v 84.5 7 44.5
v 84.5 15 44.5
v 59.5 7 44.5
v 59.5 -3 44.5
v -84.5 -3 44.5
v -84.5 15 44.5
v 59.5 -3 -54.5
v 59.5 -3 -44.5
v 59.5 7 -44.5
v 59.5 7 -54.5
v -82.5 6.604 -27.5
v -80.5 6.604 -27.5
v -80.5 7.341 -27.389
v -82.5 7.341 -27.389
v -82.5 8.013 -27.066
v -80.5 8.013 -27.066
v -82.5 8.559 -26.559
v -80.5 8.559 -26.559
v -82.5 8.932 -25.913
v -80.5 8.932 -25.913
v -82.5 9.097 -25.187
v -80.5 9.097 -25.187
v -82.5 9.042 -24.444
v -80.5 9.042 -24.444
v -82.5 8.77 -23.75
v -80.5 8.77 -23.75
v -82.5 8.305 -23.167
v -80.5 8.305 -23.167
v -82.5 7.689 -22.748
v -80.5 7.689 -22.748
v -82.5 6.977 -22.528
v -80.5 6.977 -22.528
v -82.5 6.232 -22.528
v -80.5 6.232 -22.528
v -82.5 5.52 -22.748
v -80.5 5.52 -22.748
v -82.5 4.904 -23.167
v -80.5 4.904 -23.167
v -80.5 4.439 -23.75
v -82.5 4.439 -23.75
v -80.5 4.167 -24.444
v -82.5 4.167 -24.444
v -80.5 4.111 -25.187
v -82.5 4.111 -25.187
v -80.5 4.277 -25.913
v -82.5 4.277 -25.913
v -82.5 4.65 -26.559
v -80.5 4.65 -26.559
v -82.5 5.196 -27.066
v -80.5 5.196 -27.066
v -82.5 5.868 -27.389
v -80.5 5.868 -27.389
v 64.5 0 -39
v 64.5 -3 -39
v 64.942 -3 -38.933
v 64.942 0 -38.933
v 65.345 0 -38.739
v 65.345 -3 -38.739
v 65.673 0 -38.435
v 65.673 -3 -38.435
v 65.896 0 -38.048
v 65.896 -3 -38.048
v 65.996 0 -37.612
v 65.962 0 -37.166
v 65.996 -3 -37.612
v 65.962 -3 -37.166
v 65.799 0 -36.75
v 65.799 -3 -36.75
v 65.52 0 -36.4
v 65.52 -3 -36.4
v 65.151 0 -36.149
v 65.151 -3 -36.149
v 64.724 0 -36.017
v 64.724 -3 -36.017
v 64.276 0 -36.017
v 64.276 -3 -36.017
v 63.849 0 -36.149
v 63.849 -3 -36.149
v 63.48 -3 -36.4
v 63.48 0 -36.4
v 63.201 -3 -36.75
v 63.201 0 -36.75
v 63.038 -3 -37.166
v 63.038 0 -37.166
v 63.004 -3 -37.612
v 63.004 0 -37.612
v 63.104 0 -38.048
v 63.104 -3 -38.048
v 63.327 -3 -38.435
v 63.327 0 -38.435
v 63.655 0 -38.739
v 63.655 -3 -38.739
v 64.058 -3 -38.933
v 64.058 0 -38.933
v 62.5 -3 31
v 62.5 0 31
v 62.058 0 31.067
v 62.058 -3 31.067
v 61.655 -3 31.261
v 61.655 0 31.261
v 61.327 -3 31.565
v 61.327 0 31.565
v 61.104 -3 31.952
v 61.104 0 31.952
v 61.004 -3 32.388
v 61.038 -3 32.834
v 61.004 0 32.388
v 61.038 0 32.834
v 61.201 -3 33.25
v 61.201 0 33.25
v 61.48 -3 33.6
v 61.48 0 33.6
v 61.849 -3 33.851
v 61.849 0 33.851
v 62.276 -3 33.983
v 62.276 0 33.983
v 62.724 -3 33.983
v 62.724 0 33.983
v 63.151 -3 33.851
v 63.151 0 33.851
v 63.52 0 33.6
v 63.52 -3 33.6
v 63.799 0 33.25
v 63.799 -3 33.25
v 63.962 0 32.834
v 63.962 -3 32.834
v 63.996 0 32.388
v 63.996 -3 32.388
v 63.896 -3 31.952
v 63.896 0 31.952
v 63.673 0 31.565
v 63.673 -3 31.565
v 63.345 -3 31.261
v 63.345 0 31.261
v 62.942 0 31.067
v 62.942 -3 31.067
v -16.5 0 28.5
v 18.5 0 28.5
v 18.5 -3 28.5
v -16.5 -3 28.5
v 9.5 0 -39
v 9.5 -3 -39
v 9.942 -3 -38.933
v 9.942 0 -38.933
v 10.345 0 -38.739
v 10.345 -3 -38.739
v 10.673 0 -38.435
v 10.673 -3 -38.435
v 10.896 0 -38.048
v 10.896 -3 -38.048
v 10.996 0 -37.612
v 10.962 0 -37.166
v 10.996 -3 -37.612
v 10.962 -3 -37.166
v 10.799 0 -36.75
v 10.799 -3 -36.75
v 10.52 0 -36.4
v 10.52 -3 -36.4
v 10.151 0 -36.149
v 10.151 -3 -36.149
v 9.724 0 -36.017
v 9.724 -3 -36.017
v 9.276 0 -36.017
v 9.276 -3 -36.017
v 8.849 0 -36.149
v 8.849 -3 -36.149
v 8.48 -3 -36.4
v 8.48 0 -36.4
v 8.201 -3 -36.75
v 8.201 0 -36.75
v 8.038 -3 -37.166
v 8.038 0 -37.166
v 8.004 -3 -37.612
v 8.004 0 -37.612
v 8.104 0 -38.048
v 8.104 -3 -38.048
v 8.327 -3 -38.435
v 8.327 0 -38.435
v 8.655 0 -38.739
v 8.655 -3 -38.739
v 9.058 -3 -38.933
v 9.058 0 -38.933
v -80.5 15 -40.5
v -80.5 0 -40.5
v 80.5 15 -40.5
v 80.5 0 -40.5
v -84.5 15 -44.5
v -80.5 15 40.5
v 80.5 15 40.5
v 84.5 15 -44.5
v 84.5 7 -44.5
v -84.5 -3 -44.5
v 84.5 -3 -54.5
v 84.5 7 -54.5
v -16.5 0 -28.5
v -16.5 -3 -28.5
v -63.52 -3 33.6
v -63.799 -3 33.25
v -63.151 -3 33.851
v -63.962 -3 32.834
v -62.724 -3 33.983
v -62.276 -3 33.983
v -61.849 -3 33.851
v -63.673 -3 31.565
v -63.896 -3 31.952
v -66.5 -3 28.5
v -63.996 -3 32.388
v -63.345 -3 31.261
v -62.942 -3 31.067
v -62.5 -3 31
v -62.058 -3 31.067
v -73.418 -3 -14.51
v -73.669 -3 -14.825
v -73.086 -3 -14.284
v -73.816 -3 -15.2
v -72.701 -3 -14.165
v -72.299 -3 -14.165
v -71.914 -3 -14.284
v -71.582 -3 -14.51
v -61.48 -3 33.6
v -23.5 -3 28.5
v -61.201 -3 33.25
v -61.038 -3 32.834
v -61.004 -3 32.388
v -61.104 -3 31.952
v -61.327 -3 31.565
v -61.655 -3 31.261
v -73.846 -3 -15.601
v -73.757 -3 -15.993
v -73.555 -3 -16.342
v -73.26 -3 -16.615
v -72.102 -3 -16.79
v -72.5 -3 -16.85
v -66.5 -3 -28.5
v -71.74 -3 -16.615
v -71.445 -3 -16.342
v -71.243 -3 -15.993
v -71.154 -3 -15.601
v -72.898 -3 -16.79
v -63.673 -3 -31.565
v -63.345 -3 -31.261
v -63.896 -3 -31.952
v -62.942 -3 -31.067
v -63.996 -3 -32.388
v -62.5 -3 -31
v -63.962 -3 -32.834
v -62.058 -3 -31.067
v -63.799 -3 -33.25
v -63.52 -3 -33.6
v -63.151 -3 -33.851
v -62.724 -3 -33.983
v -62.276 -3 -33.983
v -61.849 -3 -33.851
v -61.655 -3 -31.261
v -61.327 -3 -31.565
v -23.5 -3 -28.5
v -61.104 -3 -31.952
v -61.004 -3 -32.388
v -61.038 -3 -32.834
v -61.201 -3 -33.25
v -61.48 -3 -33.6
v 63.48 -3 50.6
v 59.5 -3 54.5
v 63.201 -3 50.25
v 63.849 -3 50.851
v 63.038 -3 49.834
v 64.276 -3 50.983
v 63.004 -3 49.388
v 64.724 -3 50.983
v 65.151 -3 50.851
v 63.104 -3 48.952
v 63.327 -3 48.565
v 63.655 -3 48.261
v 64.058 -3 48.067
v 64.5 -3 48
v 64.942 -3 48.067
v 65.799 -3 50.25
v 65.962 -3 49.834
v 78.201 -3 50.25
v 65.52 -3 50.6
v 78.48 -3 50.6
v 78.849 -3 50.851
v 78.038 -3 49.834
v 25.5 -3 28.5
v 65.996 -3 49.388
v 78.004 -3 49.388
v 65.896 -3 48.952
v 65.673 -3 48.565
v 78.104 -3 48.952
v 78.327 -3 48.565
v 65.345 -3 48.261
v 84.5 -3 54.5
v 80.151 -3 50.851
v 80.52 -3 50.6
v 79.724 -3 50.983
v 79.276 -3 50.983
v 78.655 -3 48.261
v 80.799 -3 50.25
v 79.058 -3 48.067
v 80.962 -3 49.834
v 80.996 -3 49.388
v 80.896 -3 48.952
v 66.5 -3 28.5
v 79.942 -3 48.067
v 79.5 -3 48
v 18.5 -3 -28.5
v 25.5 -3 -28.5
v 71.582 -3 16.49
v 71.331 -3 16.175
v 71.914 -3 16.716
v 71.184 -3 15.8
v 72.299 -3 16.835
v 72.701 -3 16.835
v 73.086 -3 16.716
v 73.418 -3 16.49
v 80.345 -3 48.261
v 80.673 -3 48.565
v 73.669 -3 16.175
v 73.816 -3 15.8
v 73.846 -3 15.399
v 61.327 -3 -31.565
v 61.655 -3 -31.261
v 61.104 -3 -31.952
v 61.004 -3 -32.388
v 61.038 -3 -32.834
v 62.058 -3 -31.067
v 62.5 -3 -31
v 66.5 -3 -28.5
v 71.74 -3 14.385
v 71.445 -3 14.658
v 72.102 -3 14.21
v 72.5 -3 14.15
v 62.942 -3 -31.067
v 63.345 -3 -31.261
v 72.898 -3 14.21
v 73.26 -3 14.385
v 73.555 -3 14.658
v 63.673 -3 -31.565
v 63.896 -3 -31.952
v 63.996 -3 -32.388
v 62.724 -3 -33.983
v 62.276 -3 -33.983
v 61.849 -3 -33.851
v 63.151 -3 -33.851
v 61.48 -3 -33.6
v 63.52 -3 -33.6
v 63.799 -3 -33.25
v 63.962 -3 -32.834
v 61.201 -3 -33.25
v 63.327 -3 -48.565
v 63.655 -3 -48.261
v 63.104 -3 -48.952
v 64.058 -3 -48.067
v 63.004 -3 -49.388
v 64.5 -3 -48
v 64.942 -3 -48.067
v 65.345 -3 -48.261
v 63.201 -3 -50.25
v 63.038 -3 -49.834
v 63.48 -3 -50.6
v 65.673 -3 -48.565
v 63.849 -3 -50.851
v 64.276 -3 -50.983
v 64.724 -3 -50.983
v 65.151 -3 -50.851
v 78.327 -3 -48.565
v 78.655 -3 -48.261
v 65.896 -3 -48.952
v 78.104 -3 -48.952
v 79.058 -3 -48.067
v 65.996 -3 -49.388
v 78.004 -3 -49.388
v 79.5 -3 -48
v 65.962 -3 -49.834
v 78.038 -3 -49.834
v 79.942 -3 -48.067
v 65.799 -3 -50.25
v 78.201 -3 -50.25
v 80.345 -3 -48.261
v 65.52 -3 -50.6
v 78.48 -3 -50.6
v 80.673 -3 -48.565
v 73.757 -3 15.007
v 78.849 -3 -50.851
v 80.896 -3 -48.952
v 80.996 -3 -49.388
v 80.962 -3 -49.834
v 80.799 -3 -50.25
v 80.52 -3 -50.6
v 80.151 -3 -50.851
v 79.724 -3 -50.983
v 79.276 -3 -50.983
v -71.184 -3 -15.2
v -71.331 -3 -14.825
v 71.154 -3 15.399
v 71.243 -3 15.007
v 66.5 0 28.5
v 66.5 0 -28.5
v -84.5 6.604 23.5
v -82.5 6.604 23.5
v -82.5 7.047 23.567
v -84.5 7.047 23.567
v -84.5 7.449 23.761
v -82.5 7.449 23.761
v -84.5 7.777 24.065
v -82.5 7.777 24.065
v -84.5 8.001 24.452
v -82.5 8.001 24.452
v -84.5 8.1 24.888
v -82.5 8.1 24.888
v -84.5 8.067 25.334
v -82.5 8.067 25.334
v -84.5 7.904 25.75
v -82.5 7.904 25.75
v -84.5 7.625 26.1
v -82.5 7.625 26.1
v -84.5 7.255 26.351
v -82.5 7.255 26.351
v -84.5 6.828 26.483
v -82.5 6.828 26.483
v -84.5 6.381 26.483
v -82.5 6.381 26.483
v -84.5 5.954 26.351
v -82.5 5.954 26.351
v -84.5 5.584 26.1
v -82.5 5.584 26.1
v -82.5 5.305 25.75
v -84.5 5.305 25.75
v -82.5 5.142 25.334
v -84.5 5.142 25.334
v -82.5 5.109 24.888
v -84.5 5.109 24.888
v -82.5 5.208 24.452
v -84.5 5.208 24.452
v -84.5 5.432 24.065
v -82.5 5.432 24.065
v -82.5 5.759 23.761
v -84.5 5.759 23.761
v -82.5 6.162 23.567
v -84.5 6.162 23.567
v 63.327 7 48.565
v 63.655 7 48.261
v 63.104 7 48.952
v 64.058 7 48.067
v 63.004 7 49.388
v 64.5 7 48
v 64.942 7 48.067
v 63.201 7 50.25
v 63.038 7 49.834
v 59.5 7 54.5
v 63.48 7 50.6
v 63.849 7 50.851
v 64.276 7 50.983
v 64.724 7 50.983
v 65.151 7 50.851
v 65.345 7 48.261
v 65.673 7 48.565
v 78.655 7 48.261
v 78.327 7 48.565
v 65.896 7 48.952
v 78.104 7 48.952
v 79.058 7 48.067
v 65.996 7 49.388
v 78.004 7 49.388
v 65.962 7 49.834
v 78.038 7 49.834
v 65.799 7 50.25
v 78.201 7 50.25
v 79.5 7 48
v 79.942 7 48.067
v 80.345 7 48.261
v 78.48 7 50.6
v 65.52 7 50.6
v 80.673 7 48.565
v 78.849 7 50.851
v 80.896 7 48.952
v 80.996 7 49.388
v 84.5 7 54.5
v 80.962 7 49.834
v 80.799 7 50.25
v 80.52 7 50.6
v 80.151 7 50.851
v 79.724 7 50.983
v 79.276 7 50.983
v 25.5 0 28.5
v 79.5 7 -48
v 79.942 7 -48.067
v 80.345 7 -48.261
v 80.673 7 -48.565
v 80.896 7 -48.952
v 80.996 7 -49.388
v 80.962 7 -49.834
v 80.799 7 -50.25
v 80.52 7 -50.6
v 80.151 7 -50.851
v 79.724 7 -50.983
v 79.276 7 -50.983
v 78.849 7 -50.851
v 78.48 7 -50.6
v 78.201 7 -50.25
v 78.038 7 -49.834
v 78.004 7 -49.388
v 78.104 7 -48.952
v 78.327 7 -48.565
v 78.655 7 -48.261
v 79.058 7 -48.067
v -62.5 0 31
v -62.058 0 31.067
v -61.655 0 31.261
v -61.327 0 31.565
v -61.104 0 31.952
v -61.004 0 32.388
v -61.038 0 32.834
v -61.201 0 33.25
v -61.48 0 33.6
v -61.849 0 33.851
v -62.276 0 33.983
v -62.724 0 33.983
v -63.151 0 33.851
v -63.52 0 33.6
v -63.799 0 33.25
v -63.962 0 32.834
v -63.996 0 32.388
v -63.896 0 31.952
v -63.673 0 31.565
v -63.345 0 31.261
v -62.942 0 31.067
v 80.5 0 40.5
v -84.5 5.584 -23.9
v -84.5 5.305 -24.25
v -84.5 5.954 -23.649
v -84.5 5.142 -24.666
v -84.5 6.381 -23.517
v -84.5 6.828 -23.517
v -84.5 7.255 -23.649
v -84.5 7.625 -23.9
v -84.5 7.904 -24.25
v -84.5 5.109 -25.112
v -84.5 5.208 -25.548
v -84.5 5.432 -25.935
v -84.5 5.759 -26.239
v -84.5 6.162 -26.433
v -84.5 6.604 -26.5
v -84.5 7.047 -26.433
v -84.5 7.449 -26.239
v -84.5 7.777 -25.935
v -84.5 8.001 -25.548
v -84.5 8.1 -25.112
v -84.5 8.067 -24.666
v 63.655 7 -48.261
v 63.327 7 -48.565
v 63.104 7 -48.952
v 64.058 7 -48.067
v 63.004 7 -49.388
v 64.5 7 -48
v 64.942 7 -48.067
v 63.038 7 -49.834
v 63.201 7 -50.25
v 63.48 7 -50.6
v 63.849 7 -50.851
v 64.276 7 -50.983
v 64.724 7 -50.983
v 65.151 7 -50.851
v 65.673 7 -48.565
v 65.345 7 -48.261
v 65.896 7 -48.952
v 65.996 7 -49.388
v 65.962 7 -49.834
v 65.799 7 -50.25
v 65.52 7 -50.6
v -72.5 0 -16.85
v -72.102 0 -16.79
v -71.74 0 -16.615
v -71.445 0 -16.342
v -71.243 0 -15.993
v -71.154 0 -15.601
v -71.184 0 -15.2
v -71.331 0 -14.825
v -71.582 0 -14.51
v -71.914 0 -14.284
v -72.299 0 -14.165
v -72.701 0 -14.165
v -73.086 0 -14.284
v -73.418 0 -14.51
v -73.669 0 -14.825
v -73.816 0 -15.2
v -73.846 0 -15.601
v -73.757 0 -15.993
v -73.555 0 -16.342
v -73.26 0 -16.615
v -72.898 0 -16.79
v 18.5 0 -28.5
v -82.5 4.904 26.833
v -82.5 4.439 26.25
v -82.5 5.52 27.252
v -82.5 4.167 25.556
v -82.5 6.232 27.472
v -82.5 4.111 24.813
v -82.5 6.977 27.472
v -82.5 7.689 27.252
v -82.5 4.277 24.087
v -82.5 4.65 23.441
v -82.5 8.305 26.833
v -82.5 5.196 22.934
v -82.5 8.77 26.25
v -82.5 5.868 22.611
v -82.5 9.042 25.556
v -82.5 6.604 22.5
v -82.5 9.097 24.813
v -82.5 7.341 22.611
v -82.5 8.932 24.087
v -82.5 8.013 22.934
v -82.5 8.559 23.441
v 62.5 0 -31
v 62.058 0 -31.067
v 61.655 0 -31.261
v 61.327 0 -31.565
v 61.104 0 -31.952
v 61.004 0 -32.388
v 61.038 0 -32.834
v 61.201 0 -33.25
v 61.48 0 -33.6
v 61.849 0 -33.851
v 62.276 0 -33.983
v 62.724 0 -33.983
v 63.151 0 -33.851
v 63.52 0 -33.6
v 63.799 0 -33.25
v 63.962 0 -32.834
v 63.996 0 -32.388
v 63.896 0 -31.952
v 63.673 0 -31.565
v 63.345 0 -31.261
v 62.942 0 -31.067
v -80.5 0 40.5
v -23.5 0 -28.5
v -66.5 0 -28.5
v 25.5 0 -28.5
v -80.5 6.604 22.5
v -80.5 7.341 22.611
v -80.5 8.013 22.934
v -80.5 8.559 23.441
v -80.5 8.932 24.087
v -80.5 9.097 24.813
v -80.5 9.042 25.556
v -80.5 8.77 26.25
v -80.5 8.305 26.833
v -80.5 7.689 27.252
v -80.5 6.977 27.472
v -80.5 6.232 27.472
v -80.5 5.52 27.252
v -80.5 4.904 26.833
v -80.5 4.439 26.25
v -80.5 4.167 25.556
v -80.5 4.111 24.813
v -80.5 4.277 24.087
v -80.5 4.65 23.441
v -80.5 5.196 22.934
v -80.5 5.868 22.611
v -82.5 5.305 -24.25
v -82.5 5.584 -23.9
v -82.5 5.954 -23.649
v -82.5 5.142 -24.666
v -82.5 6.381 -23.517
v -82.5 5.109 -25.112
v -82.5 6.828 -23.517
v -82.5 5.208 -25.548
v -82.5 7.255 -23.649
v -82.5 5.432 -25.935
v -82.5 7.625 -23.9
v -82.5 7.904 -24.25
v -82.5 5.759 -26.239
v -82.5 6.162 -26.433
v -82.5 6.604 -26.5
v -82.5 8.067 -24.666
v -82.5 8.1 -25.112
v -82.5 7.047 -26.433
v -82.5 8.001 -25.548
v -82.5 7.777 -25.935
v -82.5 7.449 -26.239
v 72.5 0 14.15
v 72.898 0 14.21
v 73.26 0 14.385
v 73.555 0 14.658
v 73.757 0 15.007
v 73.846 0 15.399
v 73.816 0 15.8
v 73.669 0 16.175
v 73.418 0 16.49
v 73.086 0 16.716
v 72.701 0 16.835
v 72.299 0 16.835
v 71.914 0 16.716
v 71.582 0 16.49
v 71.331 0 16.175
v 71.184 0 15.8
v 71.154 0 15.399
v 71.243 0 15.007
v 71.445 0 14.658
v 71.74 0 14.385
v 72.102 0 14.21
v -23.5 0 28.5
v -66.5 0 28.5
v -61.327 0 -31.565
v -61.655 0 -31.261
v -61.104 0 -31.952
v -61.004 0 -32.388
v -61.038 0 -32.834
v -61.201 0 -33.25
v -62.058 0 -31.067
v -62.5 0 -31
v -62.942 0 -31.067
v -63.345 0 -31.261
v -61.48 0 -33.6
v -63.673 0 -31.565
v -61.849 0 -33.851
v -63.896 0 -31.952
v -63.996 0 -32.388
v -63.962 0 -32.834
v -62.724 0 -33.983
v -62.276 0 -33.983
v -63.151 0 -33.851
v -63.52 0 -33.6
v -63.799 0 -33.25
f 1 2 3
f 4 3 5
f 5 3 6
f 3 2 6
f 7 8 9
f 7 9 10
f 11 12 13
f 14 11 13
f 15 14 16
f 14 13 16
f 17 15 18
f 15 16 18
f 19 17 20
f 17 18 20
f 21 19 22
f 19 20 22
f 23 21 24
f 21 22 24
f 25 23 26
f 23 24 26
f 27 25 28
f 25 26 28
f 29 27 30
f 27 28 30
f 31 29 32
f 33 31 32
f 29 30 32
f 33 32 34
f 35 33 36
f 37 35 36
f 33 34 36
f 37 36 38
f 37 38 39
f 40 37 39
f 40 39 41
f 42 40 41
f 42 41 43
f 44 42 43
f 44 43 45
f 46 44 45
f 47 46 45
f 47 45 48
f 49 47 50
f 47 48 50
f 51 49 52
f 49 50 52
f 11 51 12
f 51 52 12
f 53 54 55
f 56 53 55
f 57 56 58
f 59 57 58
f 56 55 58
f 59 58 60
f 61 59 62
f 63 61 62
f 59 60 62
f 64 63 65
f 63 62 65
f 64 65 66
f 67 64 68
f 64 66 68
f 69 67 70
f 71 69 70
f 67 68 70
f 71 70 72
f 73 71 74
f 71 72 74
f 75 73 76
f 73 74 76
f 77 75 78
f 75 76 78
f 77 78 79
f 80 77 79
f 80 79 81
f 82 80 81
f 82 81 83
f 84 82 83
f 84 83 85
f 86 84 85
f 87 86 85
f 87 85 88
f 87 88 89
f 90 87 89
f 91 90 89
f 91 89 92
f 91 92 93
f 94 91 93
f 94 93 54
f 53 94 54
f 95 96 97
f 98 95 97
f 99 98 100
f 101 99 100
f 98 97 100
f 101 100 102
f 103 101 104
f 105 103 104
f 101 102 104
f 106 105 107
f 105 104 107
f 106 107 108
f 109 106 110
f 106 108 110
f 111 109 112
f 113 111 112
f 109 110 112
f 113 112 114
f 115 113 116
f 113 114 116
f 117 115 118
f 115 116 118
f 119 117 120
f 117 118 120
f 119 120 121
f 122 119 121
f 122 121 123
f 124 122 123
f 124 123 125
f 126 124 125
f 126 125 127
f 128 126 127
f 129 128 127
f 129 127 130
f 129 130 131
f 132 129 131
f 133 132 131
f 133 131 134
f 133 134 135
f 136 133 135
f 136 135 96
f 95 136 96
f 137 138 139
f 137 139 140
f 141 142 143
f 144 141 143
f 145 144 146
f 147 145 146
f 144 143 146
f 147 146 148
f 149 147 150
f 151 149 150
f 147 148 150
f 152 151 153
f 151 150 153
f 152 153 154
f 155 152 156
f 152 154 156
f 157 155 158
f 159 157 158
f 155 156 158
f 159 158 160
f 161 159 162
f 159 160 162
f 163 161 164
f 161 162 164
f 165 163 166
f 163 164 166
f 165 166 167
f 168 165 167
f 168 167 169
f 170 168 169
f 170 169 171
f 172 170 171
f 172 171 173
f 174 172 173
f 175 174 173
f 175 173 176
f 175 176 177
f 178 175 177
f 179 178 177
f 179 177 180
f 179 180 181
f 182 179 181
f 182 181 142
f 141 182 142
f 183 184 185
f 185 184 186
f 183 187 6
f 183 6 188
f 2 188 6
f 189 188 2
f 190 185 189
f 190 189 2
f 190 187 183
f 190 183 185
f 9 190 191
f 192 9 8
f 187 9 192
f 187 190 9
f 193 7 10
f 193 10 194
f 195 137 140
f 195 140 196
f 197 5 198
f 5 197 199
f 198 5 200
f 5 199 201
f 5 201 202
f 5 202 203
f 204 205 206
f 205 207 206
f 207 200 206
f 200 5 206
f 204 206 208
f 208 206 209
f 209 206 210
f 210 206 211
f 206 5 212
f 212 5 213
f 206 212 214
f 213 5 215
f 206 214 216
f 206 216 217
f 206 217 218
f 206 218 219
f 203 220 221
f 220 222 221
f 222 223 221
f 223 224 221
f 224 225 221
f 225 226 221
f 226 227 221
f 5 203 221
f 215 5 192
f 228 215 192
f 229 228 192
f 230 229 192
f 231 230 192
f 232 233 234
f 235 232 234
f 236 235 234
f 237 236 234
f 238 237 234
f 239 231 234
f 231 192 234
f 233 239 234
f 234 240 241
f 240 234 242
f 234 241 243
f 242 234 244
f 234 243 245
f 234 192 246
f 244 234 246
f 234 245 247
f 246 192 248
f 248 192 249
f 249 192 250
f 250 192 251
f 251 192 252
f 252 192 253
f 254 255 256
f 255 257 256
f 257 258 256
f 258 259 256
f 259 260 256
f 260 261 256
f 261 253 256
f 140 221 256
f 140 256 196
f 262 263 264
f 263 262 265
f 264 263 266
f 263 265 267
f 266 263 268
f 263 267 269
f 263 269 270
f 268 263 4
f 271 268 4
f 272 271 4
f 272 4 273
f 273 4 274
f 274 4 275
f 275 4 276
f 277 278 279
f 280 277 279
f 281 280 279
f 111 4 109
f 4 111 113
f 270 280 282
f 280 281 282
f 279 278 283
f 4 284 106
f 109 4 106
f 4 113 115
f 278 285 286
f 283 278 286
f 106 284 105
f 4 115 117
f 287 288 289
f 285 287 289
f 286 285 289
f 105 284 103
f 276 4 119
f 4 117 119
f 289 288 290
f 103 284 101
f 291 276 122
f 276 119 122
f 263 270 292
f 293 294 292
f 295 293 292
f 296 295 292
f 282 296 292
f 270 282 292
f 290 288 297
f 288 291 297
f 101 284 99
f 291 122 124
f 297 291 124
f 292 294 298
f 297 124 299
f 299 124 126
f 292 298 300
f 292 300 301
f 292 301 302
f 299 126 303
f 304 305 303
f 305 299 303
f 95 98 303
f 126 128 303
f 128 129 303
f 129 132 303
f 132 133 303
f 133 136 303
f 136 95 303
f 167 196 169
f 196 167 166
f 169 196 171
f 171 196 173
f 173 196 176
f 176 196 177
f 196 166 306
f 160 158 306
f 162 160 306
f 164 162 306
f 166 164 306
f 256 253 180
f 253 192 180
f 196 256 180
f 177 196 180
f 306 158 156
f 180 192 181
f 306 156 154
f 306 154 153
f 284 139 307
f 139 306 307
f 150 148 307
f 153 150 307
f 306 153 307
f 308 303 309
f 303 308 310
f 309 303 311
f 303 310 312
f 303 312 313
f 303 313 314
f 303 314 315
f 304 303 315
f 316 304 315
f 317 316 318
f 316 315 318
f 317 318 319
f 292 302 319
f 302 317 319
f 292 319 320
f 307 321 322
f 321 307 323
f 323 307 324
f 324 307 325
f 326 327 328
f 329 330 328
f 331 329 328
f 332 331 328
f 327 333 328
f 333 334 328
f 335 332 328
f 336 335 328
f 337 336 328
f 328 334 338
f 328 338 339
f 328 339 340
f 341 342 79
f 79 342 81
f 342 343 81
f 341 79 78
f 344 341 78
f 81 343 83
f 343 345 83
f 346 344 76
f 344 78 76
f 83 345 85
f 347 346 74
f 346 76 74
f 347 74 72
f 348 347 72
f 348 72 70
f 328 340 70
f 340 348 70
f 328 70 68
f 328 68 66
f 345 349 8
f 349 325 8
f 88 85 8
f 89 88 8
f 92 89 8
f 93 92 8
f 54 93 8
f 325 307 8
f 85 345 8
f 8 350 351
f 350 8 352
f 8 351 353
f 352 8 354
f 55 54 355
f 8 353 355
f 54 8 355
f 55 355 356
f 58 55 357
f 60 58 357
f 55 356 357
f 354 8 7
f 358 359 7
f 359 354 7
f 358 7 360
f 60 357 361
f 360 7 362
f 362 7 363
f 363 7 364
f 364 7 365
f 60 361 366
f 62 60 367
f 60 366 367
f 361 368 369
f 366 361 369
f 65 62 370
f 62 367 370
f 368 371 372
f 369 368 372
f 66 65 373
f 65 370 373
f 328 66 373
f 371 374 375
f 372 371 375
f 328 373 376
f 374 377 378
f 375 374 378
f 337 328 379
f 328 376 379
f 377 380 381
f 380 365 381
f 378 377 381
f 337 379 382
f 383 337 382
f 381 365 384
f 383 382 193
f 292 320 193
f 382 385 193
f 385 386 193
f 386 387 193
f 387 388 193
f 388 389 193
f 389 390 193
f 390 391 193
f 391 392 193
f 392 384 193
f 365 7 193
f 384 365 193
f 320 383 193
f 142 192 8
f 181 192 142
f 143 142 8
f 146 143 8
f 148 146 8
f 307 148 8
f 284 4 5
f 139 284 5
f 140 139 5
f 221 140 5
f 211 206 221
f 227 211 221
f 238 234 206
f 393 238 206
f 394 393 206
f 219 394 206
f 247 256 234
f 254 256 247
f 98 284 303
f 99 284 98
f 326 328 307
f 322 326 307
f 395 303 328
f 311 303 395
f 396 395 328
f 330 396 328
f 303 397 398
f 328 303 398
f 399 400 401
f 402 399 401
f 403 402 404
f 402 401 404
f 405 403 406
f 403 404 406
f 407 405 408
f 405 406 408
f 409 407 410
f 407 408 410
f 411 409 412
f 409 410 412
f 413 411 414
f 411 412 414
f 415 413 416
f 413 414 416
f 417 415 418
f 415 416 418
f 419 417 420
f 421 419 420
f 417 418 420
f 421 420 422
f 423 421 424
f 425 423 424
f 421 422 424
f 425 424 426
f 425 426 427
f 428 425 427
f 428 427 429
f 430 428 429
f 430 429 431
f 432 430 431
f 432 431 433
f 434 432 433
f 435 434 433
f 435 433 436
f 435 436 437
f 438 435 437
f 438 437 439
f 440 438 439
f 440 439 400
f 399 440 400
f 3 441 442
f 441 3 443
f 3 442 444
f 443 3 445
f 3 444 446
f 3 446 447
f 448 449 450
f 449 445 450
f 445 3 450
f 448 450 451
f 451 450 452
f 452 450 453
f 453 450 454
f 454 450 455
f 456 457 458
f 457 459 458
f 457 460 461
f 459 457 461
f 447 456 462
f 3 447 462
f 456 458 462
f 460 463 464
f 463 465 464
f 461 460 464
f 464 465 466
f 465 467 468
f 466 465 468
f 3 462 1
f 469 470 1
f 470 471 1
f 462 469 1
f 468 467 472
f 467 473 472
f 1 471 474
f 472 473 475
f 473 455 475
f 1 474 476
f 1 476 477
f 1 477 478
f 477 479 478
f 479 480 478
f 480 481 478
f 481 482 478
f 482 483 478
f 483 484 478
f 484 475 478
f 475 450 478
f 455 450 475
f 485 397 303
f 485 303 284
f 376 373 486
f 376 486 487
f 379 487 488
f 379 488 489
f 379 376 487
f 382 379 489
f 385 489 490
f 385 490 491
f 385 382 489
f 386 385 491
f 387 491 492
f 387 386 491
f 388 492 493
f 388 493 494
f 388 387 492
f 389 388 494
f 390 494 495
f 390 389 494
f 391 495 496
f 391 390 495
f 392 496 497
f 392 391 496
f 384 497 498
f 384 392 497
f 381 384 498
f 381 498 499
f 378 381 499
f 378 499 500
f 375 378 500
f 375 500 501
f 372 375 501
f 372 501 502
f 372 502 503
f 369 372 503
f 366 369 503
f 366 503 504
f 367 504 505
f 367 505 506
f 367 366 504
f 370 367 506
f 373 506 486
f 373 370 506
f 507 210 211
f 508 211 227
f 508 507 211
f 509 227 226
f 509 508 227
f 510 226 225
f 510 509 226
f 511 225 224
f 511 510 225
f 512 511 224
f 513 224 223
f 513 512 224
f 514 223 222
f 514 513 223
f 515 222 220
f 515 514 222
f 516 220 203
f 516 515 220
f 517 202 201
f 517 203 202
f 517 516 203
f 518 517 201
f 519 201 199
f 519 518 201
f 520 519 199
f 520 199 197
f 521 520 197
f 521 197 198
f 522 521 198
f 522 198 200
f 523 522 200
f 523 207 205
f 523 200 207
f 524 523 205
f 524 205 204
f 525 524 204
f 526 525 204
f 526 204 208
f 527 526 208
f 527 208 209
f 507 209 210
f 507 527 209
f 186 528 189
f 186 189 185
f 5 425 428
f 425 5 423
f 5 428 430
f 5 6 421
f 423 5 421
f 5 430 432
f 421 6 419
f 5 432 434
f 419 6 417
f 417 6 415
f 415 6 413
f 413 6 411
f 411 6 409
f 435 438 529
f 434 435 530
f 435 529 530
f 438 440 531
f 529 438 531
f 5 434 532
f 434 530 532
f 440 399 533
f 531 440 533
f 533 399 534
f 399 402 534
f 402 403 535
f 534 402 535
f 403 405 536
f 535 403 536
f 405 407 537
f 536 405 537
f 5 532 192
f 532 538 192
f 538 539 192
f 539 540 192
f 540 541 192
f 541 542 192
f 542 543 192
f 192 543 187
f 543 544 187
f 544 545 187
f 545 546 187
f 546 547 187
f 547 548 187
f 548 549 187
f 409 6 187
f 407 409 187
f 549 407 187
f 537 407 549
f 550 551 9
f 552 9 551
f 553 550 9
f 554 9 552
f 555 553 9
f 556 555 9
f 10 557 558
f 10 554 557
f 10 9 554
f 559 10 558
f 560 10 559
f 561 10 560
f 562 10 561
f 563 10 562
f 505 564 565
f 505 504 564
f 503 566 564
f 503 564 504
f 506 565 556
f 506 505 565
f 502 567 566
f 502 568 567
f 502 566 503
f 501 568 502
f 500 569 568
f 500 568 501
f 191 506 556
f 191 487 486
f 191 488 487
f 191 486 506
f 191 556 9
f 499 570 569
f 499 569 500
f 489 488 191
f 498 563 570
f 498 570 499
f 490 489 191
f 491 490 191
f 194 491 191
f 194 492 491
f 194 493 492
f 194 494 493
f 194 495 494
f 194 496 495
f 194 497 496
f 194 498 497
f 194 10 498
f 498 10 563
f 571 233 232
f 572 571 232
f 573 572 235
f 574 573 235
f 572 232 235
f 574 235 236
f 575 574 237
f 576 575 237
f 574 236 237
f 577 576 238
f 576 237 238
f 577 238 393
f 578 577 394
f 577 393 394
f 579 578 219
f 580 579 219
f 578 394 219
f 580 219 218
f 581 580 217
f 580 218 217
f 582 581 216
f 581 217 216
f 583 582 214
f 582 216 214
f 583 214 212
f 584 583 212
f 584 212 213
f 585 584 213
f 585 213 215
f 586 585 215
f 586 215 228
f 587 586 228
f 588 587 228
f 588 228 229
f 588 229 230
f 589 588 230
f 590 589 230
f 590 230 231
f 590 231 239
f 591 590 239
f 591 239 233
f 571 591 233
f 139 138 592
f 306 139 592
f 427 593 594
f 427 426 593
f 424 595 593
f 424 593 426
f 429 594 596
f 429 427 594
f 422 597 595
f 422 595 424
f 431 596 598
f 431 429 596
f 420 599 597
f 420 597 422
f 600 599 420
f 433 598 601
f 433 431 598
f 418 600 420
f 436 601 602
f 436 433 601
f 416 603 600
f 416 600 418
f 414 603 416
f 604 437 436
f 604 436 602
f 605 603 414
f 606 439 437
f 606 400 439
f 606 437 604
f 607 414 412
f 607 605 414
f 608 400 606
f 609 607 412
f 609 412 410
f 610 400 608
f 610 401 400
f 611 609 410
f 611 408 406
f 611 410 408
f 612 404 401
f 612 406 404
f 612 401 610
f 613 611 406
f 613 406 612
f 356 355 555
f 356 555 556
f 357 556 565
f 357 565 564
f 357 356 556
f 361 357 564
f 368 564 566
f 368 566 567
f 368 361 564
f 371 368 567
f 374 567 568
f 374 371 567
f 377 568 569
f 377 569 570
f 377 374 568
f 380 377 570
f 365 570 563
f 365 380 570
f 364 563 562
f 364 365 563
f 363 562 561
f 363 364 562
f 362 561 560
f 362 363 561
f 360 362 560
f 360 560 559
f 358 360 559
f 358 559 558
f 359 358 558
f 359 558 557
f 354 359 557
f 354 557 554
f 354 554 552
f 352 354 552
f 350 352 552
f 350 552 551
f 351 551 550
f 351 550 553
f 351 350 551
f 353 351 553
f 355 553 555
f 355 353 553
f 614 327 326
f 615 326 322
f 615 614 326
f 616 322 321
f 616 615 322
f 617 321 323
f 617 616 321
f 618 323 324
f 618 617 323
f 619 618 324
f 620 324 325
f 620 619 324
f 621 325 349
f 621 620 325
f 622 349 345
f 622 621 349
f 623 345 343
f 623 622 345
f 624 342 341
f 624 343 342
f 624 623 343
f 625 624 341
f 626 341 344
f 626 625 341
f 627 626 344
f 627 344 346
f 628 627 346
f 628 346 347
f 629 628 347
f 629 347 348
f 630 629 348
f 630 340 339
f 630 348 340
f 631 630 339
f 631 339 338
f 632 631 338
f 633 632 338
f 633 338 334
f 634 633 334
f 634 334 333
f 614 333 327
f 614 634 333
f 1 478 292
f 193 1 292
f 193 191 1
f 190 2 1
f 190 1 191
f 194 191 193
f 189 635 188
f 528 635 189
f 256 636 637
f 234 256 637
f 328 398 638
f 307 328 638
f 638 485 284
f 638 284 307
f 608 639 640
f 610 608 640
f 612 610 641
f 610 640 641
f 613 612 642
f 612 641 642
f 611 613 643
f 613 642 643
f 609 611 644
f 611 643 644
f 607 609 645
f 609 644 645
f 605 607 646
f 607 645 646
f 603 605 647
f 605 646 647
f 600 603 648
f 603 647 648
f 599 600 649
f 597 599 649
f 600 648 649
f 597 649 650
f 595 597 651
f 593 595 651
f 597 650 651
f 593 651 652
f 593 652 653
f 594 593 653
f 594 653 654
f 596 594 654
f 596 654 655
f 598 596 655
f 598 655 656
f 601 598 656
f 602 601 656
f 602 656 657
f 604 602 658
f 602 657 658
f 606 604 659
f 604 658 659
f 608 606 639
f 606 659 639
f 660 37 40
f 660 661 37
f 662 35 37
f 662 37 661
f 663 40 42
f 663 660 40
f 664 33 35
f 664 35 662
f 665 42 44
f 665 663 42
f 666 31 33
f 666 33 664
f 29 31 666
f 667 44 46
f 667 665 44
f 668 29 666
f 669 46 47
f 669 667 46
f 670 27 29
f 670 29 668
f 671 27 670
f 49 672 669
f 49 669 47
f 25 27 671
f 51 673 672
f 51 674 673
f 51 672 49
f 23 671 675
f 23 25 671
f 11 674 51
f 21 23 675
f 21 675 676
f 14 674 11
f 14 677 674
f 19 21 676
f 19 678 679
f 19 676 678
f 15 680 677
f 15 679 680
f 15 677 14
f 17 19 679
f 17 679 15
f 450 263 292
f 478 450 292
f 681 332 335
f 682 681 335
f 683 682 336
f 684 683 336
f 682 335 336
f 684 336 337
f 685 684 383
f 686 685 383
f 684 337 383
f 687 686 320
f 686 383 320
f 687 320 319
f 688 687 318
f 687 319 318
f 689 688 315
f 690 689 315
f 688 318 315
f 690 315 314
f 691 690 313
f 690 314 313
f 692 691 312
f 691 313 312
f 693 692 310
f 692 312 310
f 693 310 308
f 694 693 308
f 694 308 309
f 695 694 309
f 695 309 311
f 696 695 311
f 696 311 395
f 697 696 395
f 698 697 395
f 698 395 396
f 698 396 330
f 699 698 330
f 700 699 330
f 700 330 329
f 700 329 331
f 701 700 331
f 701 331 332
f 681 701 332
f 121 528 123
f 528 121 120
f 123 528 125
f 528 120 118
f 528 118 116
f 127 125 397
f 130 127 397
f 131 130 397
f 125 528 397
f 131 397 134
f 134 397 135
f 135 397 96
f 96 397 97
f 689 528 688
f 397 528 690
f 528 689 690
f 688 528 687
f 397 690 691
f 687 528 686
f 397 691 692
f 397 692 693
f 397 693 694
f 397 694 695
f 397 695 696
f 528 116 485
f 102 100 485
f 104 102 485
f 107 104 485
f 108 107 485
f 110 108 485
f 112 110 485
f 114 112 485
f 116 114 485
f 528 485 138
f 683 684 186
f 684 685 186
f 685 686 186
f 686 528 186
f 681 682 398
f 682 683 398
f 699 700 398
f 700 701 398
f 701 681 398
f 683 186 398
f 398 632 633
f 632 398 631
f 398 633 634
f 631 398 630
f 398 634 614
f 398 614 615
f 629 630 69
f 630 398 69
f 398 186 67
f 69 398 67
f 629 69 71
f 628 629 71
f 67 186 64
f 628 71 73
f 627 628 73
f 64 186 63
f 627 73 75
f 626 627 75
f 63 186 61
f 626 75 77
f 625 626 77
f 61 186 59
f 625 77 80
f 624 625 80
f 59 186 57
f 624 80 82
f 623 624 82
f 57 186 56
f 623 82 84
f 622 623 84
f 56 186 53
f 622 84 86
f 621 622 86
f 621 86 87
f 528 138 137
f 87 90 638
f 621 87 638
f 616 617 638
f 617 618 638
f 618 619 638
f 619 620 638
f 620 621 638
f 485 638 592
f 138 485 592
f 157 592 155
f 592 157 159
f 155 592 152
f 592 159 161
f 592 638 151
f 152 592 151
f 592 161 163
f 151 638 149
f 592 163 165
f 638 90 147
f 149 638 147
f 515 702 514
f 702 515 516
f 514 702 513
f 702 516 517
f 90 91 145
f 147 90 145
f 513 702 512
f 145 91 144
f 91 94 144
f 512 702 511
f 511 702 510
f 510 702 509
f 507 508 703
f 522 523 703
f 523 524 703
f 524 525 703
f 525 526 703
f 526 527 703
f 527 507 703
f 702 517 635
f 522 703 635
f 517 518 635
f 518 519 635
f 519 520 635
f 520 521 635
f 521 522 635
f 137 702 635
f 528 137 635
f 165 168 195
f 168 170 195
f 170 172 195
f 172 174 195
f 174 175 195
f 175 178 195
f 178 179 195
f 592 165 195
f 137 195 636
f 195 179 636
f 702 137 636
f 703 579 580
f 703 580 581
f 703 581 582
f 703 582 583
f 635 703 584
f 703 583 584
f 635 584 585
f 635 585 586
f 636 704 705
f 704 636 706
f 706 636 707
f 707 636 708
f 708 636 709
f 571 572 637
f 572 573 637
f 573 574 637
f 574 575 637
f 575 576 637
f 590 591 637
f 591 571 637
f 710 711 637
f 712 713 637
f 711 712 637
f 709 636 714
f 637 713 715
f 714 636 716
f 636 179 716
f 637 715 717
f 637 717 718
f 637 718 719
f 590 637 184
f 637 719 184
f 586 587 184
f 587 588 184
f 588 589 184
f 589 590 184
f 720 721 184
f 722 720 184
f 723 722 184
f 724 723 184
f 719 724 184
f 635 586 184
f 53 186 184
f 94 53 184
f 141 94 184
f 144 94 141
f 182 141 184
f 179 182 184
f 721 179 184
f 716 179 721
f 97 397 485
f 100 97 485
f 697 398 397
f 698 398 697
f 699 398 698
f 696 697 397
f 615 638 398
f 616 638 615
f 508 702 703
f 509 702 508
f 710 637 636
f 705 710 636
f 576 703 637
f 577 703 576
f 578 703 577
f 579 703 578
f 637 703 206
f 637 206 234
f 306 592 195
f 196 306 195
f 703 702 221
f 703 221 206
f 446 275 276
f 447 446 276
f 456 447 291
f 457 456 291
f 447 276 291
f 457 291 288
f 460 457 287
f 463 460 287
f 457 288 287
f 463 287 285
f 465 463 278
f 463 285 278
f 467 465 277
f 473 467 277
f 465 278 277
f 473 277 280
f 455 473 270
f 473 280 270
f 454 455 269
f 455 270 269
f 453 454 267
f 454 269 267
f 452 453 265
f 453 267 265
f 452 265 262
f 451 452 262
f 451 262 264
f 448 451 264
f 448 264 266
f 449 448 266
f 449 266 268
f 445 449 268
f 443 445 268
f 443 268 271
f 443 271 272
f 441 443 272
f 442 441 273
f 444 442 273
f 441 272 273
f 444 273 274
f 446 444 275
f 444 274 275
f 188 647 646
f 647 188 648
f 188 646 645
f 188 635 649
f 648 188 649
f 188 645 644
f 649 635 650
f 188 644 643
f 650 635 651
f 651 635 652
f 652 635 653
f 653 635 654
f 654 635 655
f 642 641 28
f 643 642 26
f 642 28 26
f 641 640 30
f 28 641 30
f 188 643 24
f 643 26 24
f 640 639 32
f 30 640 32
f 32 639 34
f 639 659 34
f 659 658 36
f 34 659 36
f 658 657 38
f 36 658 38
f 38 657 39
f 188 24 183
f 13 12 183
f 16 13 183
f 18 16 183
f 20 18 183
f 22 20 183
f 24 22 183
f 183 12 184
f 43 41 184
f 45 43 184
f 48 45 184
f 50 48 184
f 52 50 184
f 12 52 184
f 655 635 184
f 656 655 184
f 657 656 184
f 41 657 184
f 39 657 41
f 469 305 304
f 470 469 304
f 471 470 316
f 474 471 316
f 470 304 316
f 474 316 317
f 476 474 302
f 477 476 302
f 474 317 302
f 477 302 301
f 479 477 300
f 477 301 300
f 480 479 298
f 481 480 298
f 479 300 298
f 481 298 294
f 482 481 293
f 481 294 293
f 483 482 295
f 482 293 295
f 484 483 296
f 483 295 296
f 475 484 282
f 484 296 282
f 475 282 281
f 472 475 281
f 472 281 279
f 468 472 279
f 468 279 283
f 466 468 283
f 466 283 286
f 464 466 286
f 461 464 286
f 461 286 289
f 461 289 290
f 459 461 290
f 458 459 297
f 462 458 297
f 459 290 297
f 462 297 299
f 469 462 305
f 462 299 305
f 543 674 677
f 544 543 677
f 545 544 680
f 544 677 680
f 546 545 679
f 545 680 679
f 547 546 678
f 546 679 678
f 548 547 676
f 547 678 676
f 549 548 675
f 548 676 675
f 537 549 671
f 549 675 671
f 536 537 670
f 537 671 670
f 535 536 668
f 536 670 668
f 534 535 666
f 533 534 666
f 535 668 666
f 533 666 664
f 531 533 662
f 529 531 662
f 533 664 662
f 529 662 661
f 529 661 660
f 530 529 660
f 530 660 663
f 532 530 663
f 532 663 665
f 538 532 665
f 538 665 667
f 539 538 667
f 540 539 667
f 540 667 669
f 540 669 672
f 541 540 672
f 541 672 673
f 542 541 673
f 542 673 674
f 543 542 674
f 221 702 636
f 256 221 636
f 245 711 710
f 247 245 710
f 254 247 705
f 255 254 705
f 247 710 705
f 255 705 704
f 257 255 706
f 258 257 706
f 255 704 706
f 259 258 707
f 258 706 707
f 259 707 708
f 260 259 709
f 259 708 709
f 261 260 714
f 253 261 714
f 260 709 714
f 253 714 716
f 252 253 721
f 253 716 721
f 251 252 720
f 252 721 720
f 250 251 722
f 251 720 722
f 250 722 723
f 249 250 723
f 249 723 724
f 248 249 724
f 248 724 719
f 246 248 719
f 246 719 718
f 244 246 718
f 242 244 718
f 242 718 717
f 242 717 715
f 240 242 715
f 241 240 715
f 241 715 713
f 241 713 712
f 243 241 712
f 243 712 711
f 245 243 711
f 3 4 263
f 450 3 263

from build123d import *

# Parameters (mm, degrees)
SKETCH1_W               = 169
SKETCH1_H               = 89
SKETCH1_W_2             = 161
SKETCH1_H_2             = 81
BOSS_EXTRUDE1_DEPTH     = 15
SKETCH2_W               = 169
SKETCH2_H               = 89
SKETCH2_W_2             = 43
SKETCH2_H_2             = 57
SKETCH2_W_3             = 41
SKETCH2_W_4             = 35
BOSS_EXTRUDE2_DEPTH     = 3
SKETCH4_R               = 1.5
CUT_EXTRUDE1_DEPTH      = 13
SKETCH5_R               = 2.5
CUT_EXTRUDE2_DEPTH      = 2
SKETCH6_R               = 1.5
CUT_EXTRUDE3_DEPTH      = 10
SKETCH8_R               = 1.5
CUT_EXTRUDE4_DEPTH      = 4
MIRROR2_COPY_1_SKETCH_R = 1.5
MIRROR2_COPY_1_DEPTH    = 4
SKETCH10_R              = 1.35
CUT_EXTRUDE5_DEPTH      = 4
SKETCH11_W              = 25
SKETCH11_H              = 10
BOSS_EXTRUDE3_DEPTH     = 10
SKETCH12_R              = 1.5
CUT_EXTRUDE6_DEPTH      = 10


with BuildPart() as part:
    # Sketch1 → Boss-Extrude1 (new body)
    with BuildSketch(Plane(origin=(0, 0, 0), x_dir=(1, 0, 0), z_dir=(0, 1, 0))):
        Rectangle(SKETCH1_W, SKETCH1_H)
        Rectangle(SKETCH1_W_2, SKETCH1_H_2, mode=Mode.SUBTRACT)
    extrude(amount=BOSS_EXTRUDE1_DEPTH)

    # Sketch2 → Boss-Extrude2 (add)
    with BuildSketch(Plane(origin=(0, 0, 0), x_dir=(-1, 0, 0), z_dir=(0, -1, 0))):
        Rectangle(SKETCH2_W, SKETCH2_H)
        with Locations((45, 0)):
            Rectangle(SKETCH2_W_2, SKETCH2_H_2, mode=Mode.SUBTRACT)
        with Locations((-46, 0)):
            Rectangle(SKETCH2_W_3, SKETCH2_H_2, mode=Mode.SUBTRACT)
        with Locations((-1, 0)):
            Rectangle(SKETCH2_W_4, SKETCH2_H_2, mode=Mode.SUBTRACT)
    extrude(amount=BOSS_EXTRUDE2_DEPTH)

    # Sketch4 → Cut-Extrude1 (cut)
    with BuildSketch(Plane(origin=(-80.5, 0, 0), x_dir=(0, 0, -1), z_dir=(1, 0, 0))):
        with Locations((-25, 6.604468408)):
            Circle(SKETCH4_R)
        with Locations((25, 6.604468408)):
            Circle(SKETCH4_R)
    extrude(amount=-CUT_EXTRUDE1_DEPTH, mode=Mode.SUBTRACT)

    # Sketch5 → Cut-Extrude2 (cut)
    with BuildSketch(Plane(origin=(-80.5, 0, 0), x_dir=(0, 0, -1), z_dir=(1, 0, 0))):
        with Locations((-25, 6.604468408)):
            Circle(SKETCH5_R)
        with Locations((25, 6.604468408)):
            Circle(SKETCH5_R)
    extrude(amount=-CUT_EXTRUDE2_DEPTH, mode=Mode.SUBTRACT)

    # Sketch6 → Cut-Extrude3 (cut)
    with BuildSketch(Plane(origin=(0, -3, 0), x_dir=(-1, 0, 0), z_dir=(0, -1, 0))):
        with Locations(Location((-9.5, 37.5, 0), (0, 0, 90))):
            Circle(SKETCH6_R)
        with Locations(Location((-64.5, 37.5, 0), (0, 0, 90))):
            Circle(SKETCH6_R)
    extrude(amount=-CUT_EXTRUDE3_DEPTH, mode=Mode.SUBTRACT)

    # Sketch8 → Cut-Extrude4 (cut)
    with BuildSketch(Plane(origin=(0, 0, 0), x_dir=(1, 0, 0), z_dir=(0, 1, 0))):
        with Locations(Location((-62.5, 32.5, 0), (0, 0, 270))):
            Circle(SKETCH8_R)
    cut_extrude4 = extrude(amount=-CUT_EXTRUDE4_DEPTH, mode=Mode.SUBTRACT)

    # Mirror1: Cut-Extrude4 across plane
    add(cut_extrude4.mirror(Plane(origin=(0, 0, 0), x_dir=(0, 0, 1), z_dir=(1, 0, 0))), mode=Mode.SUBTRACT)

    # Mirror2: Cut-Extrude4 across plane
    add(cut_extrude4.mirror(Plane.XY), mode=Mode.SUBTRACT)

    # Mirror2 copy 1 sketch → Mirror2 copy 1 (cut)
    with BuildSketch(Plane(origin=(0, 0, 0), x_dir=(-1, 0, 0), z_dir=(0, 1, 0))):
        with Locations(Location((-62.5, 32.5, 0), (0, 0, 270))):
            Circle(MIRROR2_COPY_1_SKETCH_R)
    extrude(amount=-MIRROR2_COPY_1_DEPTH, mode=Mode.SUBTRACT)

    # Sketch10 → Cut-Extrude5 (cut)
    with BuildSketch(Plane.XZ.offset(3)):
        with Locations(Location((72.5, 15.5, 0), (0, 0, 270))):
            Circle(SKETCH10_R)
        with Locations(Location((-72.5, -15.5, 0), (0, 0, 270))):
            Circle(SKETCH10_R)
    extrude(amount=-CUT_EXTRUDE5_DEPTH, mode=Mode.SUBTRACT)

    # Sketch11 → Boss-Extrude3 (add)
    with BuildSketch(Plane.XZ.offset(3)):
        with Locations((72, 49.5)):
            Rectangle(SKETCH11_W, SKETCH11_H)
    boss_extrude3 = extrude(amount=-BOSS_EXTRUDE3_DEPTH)

    # Sketch12 → Cut-Extrude6 (cut)
    with BuildSketch(Plane.XZ.offset(3)):
        with Locations(Location((64.5, 49.5, 0), (0, 0, 270))):
            Circle(SKETCH12_R)
        with Locations(Location((79.5, 49.5, 0), (0, 0, 270))):
            Circle(SKETCH12_R)
    cut_extrude6 = extrude(amount=-CUT_EXTRUDE6_DEPTH, mode=Mode.SUBTRACT)

    # Mirror3: Boss-Extrude3, Cut-Extrude6 across plane
    add(boss_extrude3.mirror(Plane.XY))
    add(cut_extrude6.mirror(Plane.XY), mode=Mode.SUBTRACT)


solid = part.part
